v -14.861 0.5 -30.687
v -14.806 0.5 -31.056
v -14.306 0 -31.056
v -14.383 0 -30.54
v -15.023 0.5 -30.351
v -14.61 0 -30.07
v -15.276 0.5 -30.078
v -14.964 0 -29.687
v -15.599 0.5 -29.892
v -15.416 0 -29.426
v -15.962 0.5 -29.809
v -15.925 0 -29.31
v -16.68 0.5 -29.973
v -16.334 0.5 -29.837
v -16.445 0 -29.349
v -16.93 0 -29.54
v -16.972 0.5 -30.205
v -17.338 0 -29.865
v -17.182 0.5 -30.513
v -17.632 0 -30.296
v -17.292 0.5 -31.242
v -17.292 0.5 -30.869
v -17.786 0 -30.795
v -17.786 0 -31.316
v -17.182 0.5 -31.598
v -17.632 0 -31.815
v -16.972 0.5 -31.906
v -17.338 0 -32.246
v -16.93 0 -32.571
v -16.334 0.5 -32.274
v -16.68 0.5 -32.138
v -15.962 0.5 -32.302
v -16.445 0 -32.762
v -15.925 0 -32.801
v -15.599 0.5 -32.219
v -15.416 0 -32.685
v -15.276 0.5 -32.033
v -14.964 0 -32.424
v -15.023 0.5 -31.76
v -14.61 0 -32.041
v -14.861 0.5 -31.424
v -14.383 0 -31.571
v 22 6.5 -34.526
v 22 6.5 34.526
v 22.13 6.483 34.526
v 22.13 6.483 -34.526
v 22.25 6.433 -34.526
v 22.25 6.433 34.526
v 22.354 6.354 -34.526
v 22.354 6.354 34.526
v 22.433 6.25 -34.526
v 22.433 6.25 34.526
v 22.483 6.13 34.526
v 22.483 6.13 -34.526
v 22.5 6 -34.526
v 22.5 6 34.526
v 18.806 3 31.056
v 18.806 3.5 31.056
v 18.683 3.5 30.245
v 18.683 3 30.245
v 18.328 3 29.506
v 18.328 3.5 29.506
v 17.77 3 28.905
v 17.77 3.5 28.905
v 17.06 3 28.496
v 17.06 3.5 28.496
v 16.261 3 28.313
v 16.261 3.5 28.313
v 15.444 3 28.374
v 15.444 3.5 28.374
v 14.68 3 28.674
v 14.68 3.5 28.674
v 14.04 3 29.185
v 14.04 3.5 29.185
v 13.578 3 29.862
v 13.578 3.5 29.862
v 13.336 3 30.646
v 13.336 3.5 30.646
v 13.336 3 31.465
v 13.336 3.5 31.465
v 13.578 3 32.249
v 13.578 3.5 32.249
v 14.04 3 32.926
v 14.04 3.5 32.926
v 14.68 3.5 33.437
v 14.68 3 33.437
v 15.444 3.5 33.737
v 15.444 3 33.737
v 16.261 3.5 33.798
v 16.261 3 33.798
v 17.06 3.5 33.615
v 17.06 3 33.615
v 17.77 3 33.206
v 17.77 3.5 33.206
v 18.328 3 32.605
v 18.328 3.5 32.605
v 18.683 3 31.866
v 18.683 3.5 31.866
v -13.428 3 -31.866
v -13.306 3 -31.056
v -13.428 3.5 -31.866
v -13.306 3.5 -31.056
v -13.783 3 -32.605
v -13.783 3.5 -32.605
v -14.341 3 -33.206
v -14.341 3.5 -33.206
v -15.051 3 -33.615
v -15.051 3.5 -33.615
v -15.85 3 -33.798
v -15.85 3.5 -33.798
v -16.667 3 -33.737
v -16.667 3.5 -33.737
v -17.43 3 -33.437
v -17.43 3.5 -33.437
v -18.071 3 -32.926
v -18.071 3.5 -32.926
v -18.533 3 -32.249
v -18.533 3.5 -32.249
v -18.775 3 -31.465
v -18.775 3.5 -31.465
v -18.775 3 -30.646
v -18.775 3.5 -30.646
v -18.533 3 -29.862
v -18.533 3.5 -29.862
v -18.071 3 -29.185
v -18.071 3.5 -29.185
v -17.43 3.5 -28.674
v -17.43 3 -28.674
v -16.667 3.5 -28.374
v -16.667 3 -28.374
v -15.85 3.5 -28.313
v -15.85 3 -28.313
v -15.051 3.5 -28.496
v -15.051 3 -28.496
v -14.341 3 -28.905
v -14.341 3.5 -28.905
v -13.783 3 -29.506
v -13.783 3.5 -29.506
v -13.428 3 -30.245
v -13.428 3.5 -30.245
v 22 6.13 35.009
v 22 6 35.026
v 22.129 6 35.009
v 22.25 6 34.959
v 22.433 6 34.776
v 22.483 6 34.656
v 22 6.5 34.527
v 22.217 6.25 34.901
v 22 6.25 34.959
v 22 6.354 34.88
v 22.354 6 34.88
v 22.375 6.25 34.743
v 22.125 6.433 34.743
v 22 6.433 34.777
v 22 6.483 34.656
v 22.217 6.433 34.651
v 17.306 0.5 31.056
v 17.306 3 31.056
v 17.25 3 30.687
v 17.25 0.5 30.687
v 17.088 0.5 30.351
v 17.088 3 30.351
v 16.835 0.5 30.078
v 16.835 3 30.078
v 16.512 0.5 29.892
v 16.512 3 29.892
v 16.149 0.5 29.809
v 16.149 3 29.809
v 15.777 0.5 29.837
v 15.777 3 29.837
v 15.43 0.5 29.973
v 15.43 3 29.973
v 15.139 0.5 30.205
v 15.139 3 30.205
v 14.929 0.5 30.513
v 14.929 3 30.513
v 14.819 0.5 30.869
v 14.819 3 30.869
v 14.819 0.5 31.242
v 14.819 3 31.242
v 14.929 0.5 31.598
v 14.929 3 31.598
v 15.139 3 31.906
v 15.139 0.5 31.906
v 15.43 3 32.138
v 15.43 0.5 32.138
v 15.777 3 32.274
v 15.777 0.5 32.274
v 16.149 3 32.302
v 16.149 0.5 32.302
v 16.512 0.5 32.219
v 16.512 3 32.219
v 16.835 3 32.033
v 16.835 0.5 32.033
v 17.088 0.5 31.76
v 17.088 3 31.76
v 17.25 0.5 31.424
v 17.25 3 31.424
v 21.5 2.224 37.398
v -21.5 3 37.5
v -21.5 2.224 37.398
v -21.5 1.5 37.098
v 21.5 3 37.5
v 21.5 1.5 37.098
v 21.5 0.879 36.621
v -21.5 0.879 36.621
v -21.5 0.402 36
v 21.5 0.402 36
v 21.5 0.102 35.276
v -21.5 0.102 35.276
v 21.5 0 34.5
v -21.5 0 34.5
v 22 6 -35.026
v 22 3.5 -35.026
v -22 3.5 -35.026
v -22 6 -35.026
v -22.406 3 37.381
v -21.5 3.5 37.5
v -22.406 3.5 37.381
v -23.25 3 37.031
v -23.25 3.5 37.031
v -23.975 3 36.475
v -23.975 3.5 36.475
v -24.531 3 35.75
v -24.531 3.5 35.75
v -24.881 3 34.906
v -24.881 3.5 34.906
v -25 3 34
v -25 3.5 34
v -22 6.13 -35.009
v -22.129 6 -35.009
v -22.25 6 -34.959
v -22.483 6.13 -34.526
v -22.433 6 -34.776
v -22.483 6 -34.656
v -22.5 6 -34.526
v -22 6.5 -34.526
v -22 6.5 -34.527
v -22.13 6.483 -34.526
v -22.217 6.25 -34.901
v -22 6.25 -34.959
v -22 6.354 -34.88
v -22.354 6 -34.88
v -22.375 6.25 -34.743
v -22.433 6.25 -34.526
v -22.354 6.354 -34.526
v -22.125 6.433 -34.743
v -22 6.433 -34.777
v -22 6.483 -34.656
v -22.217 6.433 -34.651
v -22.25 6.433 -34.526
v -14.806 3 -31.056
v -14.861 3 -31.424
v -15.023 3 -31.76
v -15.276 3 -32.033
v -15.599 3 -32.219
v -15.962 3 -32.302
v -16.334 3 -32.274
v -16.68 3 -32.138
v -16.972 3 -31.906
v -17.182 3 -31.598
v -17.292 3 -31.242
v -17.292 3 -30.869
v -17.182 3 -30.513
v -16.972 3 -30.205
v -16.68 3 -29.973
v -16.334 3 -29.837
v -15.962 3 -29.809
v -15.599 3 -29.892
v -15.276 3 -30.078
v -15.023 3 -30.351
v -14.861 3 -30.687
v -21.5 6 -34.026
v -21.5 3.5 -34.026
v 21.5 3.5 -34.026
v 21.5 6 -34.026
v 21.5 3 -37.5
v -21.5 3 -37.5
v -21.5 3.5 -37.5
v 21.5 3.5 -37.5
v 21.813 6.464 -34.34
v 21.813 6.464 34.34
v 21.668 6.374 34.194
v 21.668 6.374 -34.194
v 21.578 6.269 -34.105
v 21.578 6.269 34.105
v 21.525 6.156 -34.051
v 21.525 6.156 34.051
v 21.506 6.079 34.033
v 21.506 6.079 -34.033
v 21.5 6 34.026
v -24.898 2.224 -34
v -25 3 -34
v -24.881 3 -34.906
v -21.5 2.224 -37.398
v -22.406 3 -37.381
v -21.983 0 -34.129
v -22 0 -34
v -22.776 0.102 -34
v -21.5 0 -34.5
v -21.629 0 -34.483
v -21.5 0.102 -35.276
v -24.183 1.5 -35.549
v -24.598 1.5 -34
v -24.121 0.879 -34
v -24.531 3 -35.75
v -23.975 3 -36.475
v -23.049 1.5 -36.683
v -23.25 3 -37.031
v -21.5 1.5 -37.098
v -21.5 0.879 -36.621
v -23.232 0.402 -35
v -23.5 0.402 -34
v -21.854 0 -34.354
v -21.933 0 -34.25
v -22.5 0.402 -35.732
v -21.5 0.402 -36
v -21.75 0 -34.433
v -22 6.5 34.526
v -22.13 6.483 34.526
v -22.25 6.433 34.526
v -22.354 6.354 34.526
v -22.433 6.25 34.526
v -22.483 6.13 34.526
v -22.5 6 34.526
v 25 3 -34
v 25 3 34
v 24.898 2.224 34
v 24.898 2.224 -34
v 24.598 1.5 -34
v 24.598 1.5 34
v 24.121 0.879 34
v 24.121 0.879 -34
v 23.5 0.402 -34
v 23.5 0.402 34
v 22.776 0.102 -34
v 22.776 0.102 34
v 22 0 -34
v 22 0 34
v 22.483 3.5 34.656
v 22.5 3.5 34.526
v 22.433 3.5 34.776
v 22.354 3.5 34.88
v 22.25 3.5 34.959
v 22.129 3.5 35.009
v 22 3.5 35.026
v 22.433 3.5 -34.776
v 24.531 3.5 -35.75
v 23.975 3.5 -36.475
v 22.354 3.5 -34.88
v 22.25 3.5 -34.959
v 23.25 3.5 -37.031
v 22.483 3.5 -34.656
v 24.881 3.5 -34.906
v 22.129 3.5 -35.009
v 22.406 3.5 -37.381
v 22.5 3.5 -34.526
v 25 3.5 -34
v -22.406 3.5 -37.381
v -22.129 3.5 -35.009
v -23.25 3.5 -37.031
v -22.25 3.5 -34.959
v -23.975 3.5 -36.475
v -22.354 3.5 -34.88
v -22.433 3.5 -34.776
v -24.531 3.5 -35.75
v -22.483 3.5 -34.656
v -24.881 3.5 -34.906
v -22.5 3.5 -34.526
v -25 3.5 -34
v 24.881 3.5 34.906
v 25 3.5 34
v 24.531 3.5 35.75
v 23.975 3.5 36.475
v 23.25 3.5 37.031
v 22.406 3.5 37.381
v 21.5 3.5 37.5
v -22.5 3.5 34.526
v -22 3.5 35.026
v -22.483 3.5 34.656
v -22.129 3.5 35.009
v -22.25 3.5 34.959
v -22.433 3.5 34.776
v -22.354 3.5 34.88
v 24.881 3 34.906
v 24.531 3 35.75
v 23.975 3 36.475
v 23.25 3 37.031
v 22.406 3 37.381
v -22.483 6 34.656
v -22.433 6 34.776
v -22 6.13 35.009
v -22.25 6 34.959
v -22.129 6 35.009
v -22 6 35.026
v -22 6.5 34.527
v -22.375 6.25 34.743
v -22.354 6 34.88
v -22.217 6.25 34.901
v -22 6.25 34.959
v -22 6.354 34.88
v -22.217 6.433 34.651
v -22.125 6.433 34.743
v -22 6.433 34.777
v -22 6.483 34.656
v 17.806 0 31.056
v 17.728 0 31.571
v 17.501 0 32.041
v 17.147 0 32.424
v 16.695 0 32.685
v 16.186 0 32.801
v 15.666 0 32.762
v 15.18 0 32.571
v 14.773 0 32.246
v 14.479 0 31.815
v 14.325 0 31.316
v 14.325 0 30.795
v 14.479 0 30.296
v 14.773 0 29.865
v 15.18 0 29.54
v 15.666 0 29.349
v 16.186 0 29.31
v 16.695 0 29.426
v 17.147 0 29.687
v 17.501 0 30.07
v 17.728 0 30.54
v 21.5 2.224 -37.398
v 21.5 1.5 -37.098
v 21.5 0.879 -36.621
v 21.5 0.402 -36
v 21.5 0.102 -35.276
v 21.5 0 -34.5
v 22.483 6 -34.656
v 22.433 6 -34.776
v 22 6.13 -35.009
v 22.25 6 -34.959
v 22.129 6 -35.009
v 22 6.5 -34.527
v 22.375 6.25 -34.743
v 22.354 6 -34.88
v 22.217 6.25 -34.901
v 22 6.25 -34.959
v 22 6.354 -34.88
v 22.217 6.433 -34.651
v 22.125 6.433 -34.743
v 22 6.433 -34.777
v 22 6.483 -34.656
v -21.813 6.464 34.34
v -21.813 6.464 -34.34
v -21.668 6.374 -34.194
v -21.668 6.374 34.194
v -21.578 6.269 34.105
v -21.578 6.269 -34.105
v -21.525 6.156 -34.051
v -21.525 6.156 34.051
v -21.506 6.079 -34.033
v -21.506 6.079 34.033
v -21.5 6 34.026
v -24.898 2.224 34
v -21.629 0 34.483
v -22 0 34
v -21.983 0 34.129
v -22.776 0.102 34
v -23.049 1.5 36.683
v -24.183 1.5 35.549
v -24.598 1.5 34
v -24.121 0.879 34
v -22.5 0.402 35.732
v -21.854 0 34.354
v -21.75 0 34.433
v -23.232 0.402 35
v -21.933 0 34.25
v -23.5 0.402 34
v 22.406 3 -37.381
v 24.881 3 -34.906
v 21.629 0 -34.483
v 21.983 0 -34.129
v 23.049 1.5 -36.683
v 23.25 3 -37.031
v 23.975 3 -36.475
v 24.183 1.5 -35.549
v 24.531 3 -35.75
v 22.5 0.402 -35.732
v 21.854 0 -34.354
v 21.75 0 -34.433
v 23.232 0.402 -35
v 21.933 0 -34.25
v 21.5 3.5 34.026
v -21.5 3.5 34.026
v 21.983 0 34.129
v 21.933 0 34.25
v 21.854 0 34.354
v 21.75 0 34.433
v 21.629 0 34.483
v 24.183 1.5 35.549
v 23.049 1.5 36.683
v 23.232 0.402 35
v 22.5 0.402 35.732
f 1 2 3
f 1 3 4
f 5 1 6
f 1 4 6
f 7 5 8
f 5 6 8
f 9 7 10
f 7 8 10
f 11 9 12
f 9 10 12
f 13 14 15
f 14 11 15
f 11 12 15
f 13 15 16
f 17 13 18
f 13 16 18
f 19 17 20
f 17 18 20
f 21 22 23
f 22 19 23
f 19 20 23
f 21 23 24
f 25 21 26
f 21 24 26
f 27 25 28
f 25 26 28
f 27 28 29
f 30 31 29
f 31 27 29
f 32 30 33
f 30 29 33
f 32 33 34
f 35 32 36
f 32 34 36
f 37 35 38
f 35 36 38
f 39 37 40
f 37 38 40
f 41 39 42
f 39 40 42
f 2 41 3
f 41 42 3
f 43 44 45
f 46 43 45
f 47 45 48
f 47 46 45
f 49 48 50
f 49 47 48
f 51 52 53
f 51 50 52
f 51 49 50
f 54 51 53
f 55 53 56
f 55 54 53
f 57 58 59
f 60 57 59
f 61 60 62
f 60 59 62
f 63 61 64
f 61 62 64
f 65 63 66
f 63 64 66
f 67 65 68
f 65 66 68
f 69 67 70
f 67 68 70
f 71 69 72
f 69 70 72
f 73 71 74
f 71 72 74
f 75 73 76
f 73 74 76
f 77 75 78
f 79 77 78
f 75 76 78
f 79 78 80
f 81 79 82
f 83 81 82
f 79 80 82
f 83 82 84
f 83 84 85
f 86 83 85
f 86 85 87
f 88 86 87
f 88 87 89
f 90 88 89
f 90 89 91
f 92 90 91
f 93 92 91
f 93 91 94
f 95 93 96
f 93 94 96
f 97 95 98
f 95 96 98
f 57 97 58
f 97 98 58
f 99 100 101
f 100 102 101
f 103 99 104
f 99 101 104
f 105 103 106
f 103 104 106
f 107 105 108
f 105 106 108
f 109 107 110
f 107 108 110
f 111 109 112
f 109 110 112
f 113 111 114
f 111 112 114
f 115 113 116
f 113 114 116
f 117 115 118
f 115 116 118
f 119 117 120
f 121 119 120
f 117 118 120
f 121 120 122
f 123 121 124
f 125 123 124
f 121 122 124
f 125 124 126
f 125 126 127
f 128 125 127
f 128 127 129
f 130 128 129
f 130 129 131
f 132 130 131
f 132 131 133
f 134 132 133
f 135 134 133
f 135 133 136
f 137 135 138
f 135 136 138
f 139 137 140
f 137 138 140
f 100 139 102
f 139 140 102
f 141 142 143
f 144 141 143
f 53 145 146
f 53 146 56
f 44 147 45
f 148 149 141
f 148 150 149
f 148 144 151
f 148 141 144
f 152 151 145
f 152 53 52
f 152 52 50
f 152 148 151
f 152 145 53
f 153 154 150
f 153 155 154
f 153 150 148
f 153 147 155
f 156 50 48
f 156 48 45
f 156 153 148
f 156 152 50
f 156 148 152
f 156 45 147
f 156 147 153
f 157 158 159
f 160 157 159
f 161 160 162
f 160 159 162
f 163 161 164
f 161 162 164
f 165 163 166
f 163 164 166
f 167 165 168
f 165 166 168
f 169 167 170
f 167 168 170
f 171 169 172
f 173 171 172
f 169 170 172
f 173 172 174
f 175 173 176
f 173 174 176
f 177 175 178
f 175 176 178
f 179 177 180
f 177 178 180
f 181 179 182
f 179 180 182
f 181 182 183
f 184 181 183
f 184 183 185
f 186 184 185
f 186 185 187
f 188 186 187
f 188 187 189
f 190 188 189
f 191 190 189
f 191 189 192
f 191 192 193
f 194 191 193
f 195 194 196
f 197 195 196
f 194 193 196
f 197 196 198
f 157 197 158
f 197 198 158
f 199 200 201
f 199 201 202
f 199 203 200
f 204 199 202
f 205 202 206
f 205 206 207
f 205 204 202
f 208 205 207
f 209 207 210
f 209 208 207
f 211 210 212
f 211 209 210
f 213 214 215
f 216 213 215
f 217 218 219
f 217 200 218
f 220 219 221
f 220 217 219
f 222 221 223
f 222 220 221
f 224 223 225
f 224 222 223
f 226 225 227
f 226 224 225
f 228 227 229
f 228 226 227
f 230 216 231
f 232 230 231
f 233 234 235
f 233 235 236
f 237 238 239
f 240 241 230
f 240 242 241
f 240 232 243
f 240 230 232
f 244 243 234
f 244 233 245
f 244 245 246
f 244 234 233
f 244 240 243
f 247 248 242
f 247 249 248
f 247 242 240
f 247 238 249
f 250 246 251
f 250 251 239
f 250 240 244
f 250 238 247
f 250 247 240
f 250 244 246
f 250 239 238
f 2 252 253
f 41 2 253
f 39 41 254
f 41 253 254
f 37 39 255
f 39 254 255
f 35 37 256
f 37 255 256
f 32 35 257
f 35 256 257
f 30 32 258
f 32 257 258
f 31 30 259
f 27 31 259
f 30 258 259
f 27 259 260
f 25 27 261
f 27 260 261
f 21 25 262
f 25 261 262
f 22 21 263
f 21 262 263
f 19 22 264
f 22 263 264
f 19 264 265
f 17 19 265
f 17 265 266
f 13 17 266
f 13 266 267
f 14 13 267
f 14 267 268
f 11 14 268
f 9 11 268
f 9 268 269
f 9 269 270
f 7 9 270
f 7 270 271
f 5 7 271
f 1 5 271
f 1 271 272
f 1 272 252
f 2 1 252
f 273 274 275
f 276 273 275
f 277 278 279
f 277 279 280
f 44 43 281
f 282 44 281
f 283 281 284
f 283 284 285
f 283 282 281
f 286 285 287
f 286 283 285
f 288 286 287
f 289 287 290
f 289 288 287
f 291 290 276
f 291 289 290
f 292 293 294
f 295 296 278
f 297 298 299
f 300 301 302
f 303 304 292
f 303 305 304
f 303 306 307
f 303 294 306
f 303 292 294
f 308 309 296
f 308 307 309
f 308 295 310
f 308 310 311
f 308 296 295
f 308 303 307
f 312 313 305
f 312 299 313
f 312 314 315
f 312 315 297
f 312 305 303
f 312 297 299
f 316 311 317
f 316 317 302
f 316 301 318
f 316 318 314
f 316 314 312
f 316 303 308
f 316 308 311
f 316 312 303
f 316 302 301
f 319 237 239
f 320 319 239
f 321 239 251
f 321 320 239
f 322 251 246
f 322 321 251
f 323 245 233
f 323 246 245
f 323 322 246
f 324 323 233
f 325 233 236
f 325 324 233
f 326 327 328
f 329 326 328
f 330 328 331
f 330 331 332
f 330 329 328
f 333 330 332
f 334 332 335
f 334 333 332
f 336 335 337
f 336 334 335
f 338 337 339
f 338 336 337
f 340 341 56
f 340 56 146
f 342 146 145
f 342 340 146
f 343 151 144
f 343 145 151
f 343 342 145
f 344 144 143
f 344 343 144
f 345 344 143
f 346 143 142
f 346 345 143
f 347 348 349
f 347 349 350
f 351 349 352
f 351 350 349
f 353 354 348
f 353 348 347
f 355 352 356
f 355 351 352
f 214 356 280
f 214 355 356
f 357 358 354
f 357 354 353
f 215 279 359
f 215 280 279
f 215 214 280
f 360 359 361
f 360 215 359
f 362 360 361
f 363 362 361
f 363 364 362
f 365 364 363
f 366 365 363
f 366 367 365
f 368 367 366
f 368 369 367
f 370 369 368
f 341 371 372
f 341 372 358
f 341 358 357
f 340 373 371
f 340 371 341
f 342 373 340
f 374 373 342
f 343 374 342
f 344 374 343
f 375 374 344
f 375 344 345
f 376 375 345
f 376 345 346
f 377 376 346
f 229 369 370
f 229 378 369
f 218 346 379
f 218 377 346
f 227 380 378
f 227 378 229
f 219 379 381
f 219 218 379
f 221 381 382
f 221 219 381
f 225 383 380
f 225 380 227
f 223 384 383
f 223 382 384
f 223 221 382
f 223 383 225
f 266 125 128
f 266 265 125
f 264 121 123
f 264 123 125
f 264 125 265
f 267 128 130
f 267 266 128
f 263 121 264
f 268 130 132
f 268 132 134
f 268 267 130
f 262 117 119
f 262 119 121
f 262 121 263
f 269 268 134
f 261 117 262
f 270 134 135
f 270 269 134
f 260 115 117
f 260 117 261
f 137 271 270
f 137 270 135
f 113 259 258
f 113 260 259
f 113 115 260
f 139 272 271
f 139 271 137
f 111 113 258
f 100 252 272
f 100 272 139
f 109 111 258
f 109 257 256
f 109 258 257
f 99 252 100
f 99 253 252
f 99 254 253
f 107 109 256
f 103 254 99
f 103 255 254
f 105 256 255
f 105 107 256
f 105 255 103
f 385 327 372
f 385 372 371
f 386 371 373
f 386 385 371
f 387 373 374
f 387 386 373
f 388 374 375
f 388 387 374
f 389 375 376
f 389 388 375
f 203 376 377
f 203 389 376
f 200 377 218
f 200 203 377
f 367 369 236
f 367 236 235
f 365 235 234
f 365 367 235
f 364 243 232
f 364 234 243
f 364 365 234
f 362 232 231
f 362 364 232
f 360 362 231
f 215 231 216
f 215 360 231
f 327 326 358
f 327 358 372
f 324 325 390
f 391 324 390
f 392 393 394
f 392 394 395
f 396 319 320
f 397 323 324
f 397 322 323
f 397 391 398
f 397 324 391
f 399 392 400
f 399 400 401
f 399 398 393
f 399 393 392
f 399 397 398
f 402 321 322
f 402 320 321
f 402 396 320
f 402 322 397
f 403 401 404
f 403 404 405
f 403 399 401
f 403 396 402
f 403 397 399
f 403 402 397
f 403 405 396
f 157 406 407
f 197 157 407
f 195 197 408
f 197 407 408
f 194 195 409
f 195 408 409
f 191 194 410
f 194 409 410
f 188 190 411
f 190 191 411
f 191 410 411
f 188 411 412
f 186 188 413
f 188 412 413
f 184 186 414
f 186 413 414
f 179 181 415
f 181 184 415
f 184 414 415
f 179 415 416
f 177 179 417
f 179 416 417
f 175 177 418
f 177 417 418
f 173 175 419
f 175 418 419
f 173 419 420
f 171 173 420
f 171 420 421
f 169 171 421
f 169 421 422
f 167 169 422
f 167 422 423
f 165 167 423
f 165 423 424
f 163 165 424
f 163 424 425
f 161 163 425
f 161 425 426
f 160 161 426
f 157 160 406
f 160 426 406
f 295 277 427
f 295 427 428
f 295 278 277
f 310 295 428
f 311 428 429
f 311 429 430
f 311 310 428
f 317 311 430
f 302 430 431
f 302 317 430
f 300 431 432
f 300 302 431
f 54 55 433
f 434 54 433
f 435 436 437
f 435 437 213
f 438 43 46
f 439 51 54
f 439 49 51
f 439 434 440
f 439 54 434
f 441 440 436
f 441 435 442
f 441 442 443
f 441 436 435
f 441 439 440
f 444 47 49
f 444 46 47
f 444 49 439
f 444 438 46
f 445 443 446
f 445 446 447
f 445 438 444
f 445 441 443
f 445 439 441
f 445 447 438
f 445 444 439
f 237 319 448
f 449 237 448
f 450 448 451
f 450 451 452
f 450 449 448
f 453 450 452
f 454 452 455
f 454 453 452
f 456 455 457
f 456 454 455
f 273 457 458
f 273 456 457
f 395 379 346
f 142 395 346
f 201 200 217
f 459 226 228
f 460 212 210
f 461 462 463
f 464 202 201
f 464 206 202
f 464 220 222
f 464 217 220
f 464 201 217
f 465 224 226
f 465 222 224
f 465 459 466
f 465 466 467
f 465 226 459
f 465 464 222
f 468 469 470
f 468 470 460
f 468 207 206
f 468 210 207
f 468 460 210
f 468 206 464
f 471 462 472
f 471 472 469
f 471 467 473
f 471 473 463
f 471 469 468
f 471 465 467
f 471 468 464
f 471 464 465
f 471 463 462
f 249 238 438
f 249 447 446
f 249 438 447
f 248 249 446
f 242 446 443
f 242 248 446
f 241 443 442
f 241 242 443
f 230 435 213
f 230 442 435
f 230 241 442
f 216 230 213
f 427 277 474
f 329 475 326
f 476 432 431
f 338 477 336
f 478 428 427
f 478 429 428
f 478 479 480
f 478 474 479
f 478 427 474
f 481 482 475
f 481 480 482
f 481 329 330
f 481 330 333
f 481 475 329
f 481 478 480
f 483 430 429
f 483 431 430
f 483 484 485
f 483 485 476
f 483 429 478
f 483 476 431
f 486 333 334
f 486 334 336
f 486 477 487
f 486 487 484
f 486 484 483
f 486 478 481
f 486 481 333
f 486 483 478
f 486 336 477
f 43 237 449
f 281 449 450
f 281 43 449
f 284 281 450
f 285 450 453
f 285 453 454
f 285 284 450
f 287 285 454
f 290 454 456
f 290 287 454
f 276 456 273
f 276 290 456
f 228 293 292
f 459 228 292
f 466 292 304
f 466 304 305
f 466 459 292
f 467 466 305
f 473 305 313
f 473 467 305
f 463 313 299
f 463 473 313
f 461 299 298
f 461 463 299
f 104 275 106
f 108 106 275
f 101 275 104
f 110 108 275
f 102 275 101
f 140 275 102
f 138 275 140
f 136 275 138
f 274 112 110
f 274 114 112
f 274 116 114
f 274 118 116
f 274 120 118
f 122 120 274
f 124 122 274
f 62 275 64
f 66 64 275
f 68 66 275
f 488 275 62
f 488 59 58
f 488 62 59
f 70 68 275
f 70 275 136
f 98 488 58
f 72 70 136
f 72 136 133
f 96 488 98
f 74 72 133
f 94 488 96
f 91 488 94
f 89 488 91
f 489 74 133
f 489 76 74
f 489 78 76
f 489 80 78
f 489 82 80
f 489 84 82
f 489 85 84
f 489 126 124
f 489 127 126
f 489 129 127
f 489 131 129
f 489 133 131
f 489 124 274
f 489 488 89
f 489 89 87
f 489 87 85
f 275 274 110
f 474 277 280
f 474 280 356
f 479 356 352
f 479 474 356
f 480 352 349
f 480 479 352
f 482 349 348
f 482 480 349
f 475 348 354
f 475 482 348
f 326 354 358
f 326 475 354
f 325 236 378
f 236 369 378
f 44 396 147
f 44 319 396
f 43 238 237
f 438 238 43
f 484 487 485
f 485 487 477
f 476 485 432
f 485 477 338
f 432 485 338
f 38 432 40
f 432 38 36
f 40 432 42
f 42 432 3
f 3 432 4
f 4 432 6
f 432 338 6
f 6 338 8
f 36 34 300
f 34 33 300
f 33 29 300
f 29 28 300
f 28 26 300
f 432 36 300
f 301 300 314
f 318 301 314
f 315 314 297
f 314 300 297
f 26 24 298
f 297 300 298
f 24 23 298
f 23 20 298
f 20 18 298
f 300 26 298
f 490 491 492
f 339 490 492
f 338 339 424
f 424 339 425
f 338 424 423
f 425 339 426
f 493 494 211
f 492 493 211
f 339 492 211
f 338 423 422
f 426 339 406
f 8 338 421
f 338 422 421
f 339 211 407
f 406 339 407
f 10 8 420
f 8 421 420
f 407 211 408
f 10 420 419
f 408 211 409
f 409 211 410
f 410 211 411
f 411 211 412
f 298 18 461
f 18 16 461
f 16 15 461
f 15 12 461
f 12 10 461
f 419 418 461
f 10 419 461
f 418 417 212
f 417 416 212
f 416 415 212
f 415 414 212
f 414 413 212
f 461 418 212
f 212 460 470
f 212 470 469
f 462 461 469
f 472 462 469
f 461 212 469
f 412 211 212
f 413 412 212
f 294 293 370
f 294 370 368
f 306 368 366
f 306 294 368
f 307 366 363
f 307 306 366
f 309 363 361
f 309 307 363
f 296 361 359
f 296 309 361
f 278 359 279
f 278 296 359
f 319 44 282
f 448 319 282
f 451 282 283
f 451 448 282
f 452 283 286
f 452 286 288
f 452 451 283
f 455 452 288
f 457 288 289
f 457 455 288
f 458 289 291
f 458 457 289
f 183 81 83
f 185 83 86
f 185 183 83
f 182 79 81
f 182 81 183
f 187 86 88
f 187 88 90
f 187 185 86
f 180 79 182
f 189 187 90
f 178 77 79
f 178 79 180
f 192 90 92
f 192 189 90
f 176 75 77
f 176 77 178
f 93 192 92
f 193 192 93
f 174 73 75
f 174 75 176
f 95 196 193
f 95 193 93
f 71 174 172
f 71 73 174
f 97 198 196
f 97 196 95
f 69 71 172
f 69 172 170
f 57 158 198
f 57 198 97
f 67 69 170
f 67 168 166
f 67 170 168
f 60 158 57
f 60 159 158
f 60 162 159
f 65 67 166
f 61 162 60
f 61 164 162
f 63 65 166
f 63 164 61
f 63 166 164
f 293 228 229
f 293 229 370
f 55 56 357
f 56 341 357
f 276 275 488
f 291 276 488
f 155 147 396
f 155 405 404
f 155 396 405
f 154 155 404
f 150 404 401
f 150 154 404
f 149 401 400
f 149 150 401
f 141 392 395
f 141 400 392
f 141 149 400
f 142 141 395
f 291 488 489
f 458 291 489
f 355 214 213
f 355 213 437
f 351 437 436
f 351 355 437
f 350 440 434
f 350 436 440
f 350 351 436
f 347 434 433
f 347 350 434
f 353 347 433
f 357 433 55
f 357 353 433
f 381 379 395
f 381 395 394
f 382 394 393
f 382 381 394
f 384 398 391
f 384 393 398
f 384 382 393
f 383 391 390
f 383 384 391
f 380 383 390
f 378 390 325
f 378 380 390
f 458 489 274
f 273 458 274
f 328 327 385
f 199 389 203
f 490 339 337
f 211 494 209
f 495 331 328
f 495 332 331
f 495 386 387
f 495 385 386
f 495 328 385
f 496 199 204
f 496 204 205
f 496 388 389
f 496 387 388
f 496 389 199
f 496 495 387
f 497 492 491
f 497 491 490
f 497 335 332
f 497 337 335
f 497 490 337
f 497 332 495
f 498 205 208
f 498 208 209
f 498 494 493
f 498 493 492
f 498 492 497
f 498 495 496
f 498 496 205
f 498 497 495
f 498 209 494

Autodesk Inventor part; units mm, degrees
ref_plane "YZ Plane" through (0, 0, 0) normal (1, 0, 0) x (0, 1, 0)
ref_plane "XZ Plane" through (0, 0, 0) normal (0, 1, 0) x (-1, 0, 0)
ref_plane "XY Plane" through (0, 0, 0) normal (0, 0, 1) x (1, 0, 0)
sketch "Sketch1" plane through (0, 0, 0) normal (0, 1, 0) x (-1, 0, 0)
  line L0 (-25, 37.5) -> (25, 37.5)
  line L1 (25, 37.5) -> (25, -37.5)
  line L2 (25, -37.5) -> (-25, -37.5)
  line L3 (-25, -37.5) -> (-25, 37.5)
  line L4 (25, 37.5) -> (-25, -37.5) construction
  line L5 (-22.5, 35) -> (22.5, 35)
  line L6 (22.5, 35) -> (22.5, -35)
  line L7 (22.5, -35) -> (-22.5, -35)
  line L8 (-22.5, -35) -> (-22.5, 35)
  line L9 (22.5, 35) -> (-22.5, -35) construction
  line L10 (22.5, 35) -> (20, 35)
  line L11 (20, 35) -> (20, 32.5)
  line L12 (20, 32.5) -> (22.5, 32.5)
  line L13 (22.5, 32.5) -> (22.5, 35)
  arc A0 (22.5, 32.5) -> (20, 35) centre (20, 32.5) ccw
  line L14 (25, 37.5) -> (21.5, 37.5)
  line L15 (21.5, 37.5) -> (21.5, 34)
  line L16 (21.5, 34) -> (25, 34)
  line L17 (25, 34) -> (25, 37.5)
  line L18 (22.5, -35) -> (20, -35)
  line L19 (20, -35) -> (20, -32.5)
  line L20 (20, -32.5) -> (22.5, -32.5)
  line L21 (22.5, -32.5) -> (22.5, -35)
  line L22 (-22.5, -35) -> (-20, -35)
  line L23 (-20, -35) -> (-20, -32.5)
  line L24 (-20, -32.5) -> (-22.5, -32.5)
  line L25 (-22.5, -32.5) -> (-22.5, -35)
  line L26 (-22.5, 35) -> (-20, 35)
  line L27 (-20, 35) -> (-20, 32.5)
  line L28 (-20, 32.5) -> (-22.5, 32.5)
  line L29 (-22.5, 32.5) -> (-22.5, 35)
  arc A1 (-20, 35) -> (-22.5, 32.5) centre (-20, 32.5) ccw
  arc A2 (-22.5, -32.5) -> (-20, -35) centre (-20, -32.5) ccw
  arc A3 (20, -35) -> (22.5, -32.5) centre (20, -32.5) ccw
  arc A4 (25, 34) -> (21.5, 37.5) centre (21.5, 34) ccw
  line L30 (25, -37.5) -> (21.5, -37.5)
  line L31 (21.5, -37.5) -> (21.5, -34)
  line L32 (21.5, -34) -> (25, -34)
  line L33 (25, -34) -> (25, -37.5)
  line L34 (-25, -37.5) -> (-21.5, -37.5)
  line L35 (-21.5, -37.5) -> (-21.5, -34)
  line L36 (-21.5, -34) -> (-25, -34)
  line L37 (-25, -34) -> (-25, -37.5)
  line L38 (-25, 37.5) -> (-21.5, 37.5)
  line L39 (-21.5, 37.5) -> (-21.5, 34)
  line L40 (-21.5, 34) -> (-25, 34)
  line L41 (-25, 34) -> (-25, 37.5)
  arc A5 (-21.5, 37.5) -> (-25, 34) centre (-21.5, 34) ccw
  arc A6 (-25, -34) -> (-21.5, -37.5) centre (-21.5, -34) ccw
  arc A7 (21.5, -37.5) -> (25, -34) centre (21.5, -34) ccw
  point P0 (0, 0)
  point P1 (25, 34)
  point P2 (-25, -34)
  point P3 (-22.5, -32.5)
  point P4 (-22, -34)
  point P5 (-22.5, -34)
  point P6 (22.5, -32.5)
  dimension "d0" = 50
  dimension "d1" = 75
  dimension "d2" = 45
  dimension "d3" = 70
  dimension "d8" = 2.5
  dimension "d9" = 2.5
extrude "Extrusion3" add sketch "Sketch1" along normal blind 3.5 contours L0 L15 L5 L39 | L39 L5 L8 L40 A5 | L40 L8 L36 L3 | A4 L16 L6 L5 L15 | L39 A1 L40 L8 L5 | L5 A1 L39 | L36 L8 L7 L35 A6 | L40 A1 L8 | L15 A0 L5 | L5 L6 L16 A0 L15 | L1 L32 L6 L16 | L5 L11 L12 L6 L20 L19 L7 L23 L24 L8 L28 L27 | L27 L28 A1 L40 L39 | L39 L40 A1 | L36 A2 L35 L7 L8 | L8 A2 L36 | L35 L7 L31 L2 | A0 L15 L16 L12 L11 | A0 L16 L15 | A7 L31 L7 L6 L32 | L6 A0 L16 | L24 L23 A2 L35 L36 | L36 L35 A2 | L35 A2 L7 | L32 A3 L6 | L6 L7 L31 A3 L32 | L7 A3 L31 | A3 L32 L31 L19 L20 | A3 L31 L32
fillet "Fillet1" radius 3 8 edges at (-23.9749, 0, 36.4749) (0, 0, 37.5) (23.9749, 0, 36.4749) (25, 0, 0) (23.9749, 0, -36.4749) (0, 0, -37.5) (-23.9749, 0, -36.4749) (-25, 0, 0)
sketch "Sketch2" plane through (0, 3.5, 0) normal (0, 1, 0) x (1, 0, 0)
  arc A0 (20, 32.5) -> (17.5, 35) centre (17.5, 32.5) ccw projected
  line L0 (17.5, 35) -> (17.5, 33.5)
  line L1 (20, -32.5) -> (20, 32.5) projected
  line L2 (20, 32.5) -> (18.5, 32.5)
  line L3 (18.5, 32.5) -> (17.5, 33.5)
  line L4 (18, 33) -> (16.0555, 31.0555)
  circle A1 centre (16.0555, 31.0555) radius 2.75
  line L5 (-20, 32.5) -> (-20, -32.5) projected
  line L6 (-20, -32.5) -> (-18.5, -32.5)
  line L7 (-17.5, -35) -> (17.5, -35) projected
  line L8 (-17.5, -35) -> (-17.5, -33.5)
  line L9 (-17.5, -33.5) -> (-18.5, -32.5)
  line L10 (-18, -33) -> (-16.0555, -31.0555)
  line L11 (-18, -33) -> (-15.25, -33) construction
  circle A2 centre (-16.0555, -31.0555) radius 2.75
  arc A3 (17.5812, 28.7675) -> (18.8055, 31.0555) centre (16.0555, 31.0555) ccw construction
  arc A4 (17.8504, 28.3639) -> (19.2906, 31.0555) centre (16.0555, 31.0555) ccw
  arc A5 (17.3121, 29.1712) -> (18.3203, 31.0555) centre (16.0555, 31.0555) ccw
  arc A6 (17.3121, 29.1712) -> (17.8504, 28.3639) centre (17.5812, 28.7675) ccw
  arc A7 (19.2906, 31.0555) -> (18.3203, 31.0555) centre (18.8055, 31.0555) ccw
  arc A8 (14.2605, 33.747) -> (12.8203, 31.0555) centre (16.0555, 31.0555) ccw
  arc A9 (12.8203, 31.0555) -> (13.7906, 31.0555) centre (13.3055, 31.0555) ccw
  arc A10 (14.7989, 32.9398) -> (14.2605, 33.747) centre (14.5297, 33.3434) ccw
  arc A11 (14.7989, 32.9398) -> (13.7906, 31.0555) centre (16.0555, 31.0555) ccw
  arc A12 (-14.2605, -33.747) -> (-12.8203, -31.0555) centre (-16.0555, -31.0555) ccw
  arc A13 (-14.7989, -32.9398) -> (-13.7906, -31.0555) centre (-16.0555, -31.0555) ccw
  arc A14 (-14.7989, -32.9398) -> (-14.2605, -33.747) centre (-14.5297, -33.3434) ccw
  arc A15 (-12.8203, -31.0555) -> (-13.7906, -31.0555) centre (-13.3055, -31.0555) ccw
  arc A16 (-17.8504, -28.3639) -> (-19.2906, -31.0555) centre (-16.0555, -31.0555) ccw
  arc A17 (-19.2906, -31.0555) -> (-18.3203, -31.0555) centre (-18.8055, -31.0555) ccw
  arc A18 (-17.3121, -29.1712) -> (-17.8504, -28.3639) centre (-17.5812, -28.7675) ccw
  arc A19 (-17.3121, -29.1712) -> (-18.3203, -31.0555) centre (-16.0555, -31.0555) ccw
  line L12 (-19.2843, -34.2843) -> (-16.7157, -31.7157) construction
  line L13 (-18.86, -34.7085) -> (-16.2915, -32.14)
  line L14 (-17.14, -31.2915) -> (-19.7085, -33.86)
  arc A20 (-19.7085, -33.86) -> (-18.86, -34.7085) centre (-19.2843, -34.2843) ccw
  arc A21 (-16.2915, -32.14) -> (-17.14, -31.2915) centre (-16.7157, -31.7157) ccw
  line L15 (16.5205, 31.5205) -> (19.4795, 34.4795) construction
  line L16 (16.9448, 31.0962) -> (19.9038, 34.0552)
  line L17 (19.0552, 34.9038) -> (16.0962, 31.9448)
  arc A22 (16.0962, 31.9448) -> (16.9448, 31.0962) centre (16.5205, 31.5205) ccw
  arc A23 (19.9038, 34.0552) -> (19.0552, 34.9038) centre (19.4795, 34.4795) ccw
  circle A24 centre (16.0555, 31.0555) radius 1.25
  circle A25 centre (-16.0555, -31.0555) radius 1.25
  line L18 (21.5, 34.5) -> (-21.5, 34.5) projected
  line L19 (0, 34.5) -> (0, -35)
  circle A26 centre (16.0555, -31.0555) radius 2.75
  circle A27 centre (16.0555, -31.0555) radius 1.25
  circle A28 centre (-16.0555, 31.0555) radius 2.75
  circle A29 centre (-16.0555, 31.0555) radius 1.25
  point P0 (0, 0)
  point P1 (18.3774, 32.5289)
  point P2 (17.5289, 33.3774)
  point P3 (14.9555, 33.5759)
  point P4 (13.3482, 30.5722)
  point P5 (17.1554, 28.535)
  point P6 (18.7627, 31.5387)
  point P7 (-18.3774, -32.5289)
  point P8 (-17.5289, -33.3774)
  point P9 (-14.9555, -33.5759)
  point P10 (-13.3482, -30.5722)
  point P11 (-17.1554, -28.535)
  point P12 (-18.7627, -31.5387)
  dimension "d32" = 5.5
  dimension "d29" = 1.5
  dimension "d30" = 1.5
  dimension "d31" = 2.75
  dimension "d33" = 1.5
  dimension "d34" = 1.5
  dimension "d35" = 2.75
  dimension "d36" = 45
  dimension "d37" = 5.5
  dimension "d40" = 360
  dimension "d44" = 1.2
  dimension "d45" = 1.2
  dimension "d60" = 2.5
  dimension "d61" = 2.5
sketch "Sketch4" plane through (0, 3.5, 0) normal (0, 1, 0) x (1, 0, 0)
  line L0 (-22, 34.5263) -> (22, 34.5263)
  line L1 (22, 34.5263) -> (22, -34.5263)
  line L2 (22, -34.5263) -> (-22, -34.5263)
  line L3 (-22, -34.5263) -> (-22, 34.5263)
  line L4 (-22, 34.5263) -> (22, -34.5263) construction
  line L5 (22, 34.5263) -> (-22, -34.5263) construction
  line L6 (21.5, 34.5) -> (-21.5, 34.5) projected
  line L7 (-21.5, 34.5) -> (-21.5, 37.5) projected
  line L8 (17.5001, 34.5) -> (-21.5, 34.5) construction
  line L9 (22, -34) -> (22, 34) projected
  line L10 (22, 32.5003) -> (22, -34.5263) construction
  arc A0 (21.5, -34.5263) -> (22.5, -34.5263) centre (22, -34.5263) ccw
  line L11 (22, -34.5263) -> (-22, -34.5263) construction
  line L12 (22, -34.0263) -> (-22, -34.0263)
  line L13 (-22, -35.0263) -> (22, -35.0263)
  arc A1 (22, -35.0263) -> (22, -34.0263) centre (22, -34.5263) ccw
  arc A2 (-22, -34.0263) -> (-22, -35.0263) centre (-22, -34.5263) ccw
  line L14 (-22, -34.5263) -> (-22, 34.5263) construction
  line L15 (-21.5, -34.5263) -> (-21.5, 34.5263)
  line L16 (-22.5, 34.5263) -> (-22.5, -34.5263)
  arc A3 (-22.5, -34.5263) -> (-21.5, -34.5263) centre (-22, -34.5263) ccw
  arc A4 (-21.5, 34.5263) -> (-22.5, 34.5263) centre (-22, 34.5263) ccw
  line L17 (22, 34.5263) -> (-22, 34.5263) construction
  line L18 (22, 35.0263) -> (-22, 35.0263)
  line L19 (-22, 34.0263) -> (22, 34.0263)
  arc A5 (22, 34.0263) -> (22, 35.0263) centre (22, 34.5263) ccw
  arc A6 (-22, 35.0263) -> (-22, 34.0263) centre (-22, 34.5263) ccw
  line L20 (22, -34.5263) -> (22, 34.5263) construction
  line L21 (22.5, -34.5263) -> (22.5, 34.5263)
  line L22 (21.5, 34.5263) -> (21.5, -34.5263)
  arc A7 (21.5, -34.5263) -> (22.5, -34.5263) centre (22, -34.5263) ccw
  arc A8 (22.5, 34.5263) -> (21.5, 34.5263) centre (22, 34.5263) ccw
  point P0 (0, 0)
  point P1 (-1.9999, 34.5)
  point P2 (22, -1.013)
  point P3 (0, -34.5263)
  point P4 (-22, 0)
  point P5 (0, 34.5263)
  point P6 (22, 0)
  point P7 (-22.5, -34.5263)
  point P8 (22, -35.0263)
  point P9 (22.5, -34.5263)
  point P10 (22.5, 34.5263)
  point P11 (-21.5, -34.0263)
  point P12 (-21.5, 34.0263)
  point P13 (21.5, 34.0263)
  point P14 (21.5, -34.0263)
  dimension "d68" = 1
  dimension "d69" = 1
  dimension "d70" = 1
  dimension "d71" = 1
  dimension "d72" = 1
extrude "Extrusion11" add sketch "Sketch4" along normal blind 3 contours L3 A6 A4 L0 | L0 L7 L15 L19 L3 | L7 L18 A8 L0 | L0 L22 L6 L7 | A4 L18 L7 | L19 L15 L12 L3 | L3 A2 L16 A6 | A8 A5 L1 L0 | L0 L1 L19 L22 | L6 L22 L19 L15 | L12 L15 L2 L3 | L3 L2 A3 A2 | L12 L22 L2 L15 | L19 L1 L12 L22 | A5 L21 A1 L1 | L2 A0 L13 A3 | L12 L1 L2 L22 | A0 L2 L1 A1
fillet "Fillet2" radius 0.5 12 edges at (-22.3536, 6.5, -34.8799) (-22.5, 6.5, 0) (-22.3536, 6.5, 34.8799) (0, 6.5, 35.0263) (22.3536, 6.5, 34.8799) (22.5, 6.5, 0) (22.3536, 6.5, -34.8799) (0, 6.5, -35.0263) (0, 6.5, -34.0263) (21.5, 6.5, 0) (0, 6.5, 34.0263) (-21.5, 6.5, 0)
extrude "Extrusion12" cut sketch "Sketch2" against normal blind 0.5 contours A26 | A28
sketch "Sketch6" plane through (0, 3.5, 0) normal (0, 1, 0) x (1, 0, 0)
  circle A0 centre (16.0555, -31.0555) radius 1.25 projected
  circle A1 centre (16.0555, -31.0555) radius 1.25
  point P0 (0, 0)
extrude "Extrusion13" cut sketch "Sketch6" against normal blind 5
sketch "Sketch7" plane through (-16.0555, 3.5, -31.0555) normal (0, 1, 0) x (1, 0, 0)
  circle A0 centre (0, 0) radius 1.25
  point P0 (16.0555, -31.0555)
extrude "Extrusion14" cut sketch "Sketch7" against normal blind 5
chamfer "Chamfer2" distance 0.5 angle 45 2 edges at (14.8055, 0, 31.0555) (-17.3055, 0, -31.0555)
properties part number "proper shit spodnji"
